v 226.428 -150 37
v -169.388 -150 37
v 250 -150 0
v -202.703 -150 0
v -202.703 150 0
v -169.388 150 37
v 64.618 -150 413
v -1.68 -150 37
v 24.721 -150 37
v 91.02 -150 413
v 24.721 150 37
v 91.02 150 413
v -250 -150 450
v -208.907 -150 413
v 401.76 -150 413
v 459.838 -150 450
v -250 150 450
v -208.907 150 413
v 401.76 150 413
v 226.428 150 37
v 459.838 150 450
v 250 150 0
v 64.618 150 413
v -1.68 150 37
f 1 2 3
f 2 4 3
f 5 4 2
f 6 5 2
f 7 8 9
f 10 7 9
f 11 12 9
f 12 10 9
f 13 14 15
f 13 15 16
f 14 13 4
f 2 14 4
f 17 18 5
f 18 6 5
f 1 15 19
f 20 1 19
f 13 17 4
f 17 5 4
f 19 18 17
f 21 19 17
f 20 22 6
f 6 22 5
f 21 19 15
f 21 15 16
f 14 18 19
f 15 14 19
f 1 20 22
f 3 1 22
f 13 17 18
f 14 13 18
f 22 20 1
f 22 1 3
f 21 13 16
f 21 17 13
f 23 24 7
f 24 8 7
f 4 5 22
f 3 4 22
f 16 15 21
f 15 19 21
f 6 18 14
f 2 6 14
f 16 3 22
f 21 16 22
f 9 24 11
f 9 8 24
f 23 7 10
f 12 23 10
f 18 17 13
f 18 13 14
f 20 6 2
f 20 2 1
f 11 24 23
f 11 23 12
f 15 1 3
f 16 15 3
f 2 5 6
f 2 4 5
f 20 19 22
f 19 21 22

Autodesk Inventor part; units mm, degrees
ref_plane "YZ Plane" through (0, 0, 0) normal (1, 0, 0) x (0, 1, 0)
ref_plane "XZ Plane" through (0, 0, 0) normal (0, 1, 0) x (-1, 0, 0)
ref_plane "XY Plane" through (0, 0, 0) normal (0, 0, 1) x (1, 0, 0)
sketch "Sketch1" plane through (0, 0, 0) normal (0, 0, 1) x (1, 0, 0)
  line L0 (-250, -150) -> (250, -150)
  line L1 (250, -150) -> (250, 150)
  line L2 (250, 150) -> (-250, 150)
  line L3 (-250, 150) -> (-250, -150)
  line L4 (-250, -150) -> (250, 150) construction
  line L5 (250, -150) -> (-250, 150) construction
  point P0 (0, 0)
  dimension "d0" = 500
  dimension "d1" = 300
extrude "Extrusion1" add sketch "Sketch1" along normal blind 450
draft "FaceDraft1" angle 25 pull direction (0, 0, -1) faces at (250, -50, 150) fixed edges at (250, 0, 0)
draft "FaceDraft2" angle 6 pull direction (0, 0, -1) faces at (-250, 50, 150) fixed edges at (-250, 0, 450)
shell "Shell1" thickness 37 removed faces 2 at (153.2795, -150, 300) at (153.2795, 150, 300)
sketch "Sketch2" plane through (-202.7031, -150, 0) normal (0, -1, 0) x (1, 0, 0)
  line L0 (-6.2042, 413) -> (604.4632, 413) construction
  line L1 (-47.2969, 450) -> (-6.2042, 413)
  line L2 (-6.2042, 413) -> (604.4632, 413)
  line L3 (604.4632, 413) -> (662.5415, 450)
  line L4 (0, 0) -> (33.3149, 37)
  line L5 (33.3149, 37) -> (429.1315, 37)
  line L6 (429.1315, 37) -> (452.7031, 0)
  point P0 (202.7031, 0)
surface extrude "ExtrusionSrf1" sketch "Sketch2" against normal up to surface (300 mm away) shown yes curves L1 L2 L3
surface extrude "ExtrusionSrf2" sketch "Sketch2" against normal up to surface (300 mm away) shown yes curves L4 L5 L6
split body "Split1" sketch "Sketch2" result two bodies curves L1 L2 L3 first body at (-13.3872, 50, 449.5)
split body "Split2" result two bodies by surface "ExtrusionSrf2" bodies 3 first body at (99.099, -50, 0.5)
sketch "Sketch3" plane through (-250, -150, 450) normal (0, -1, 0) x (1, 0, 0)
  line L0 (314.6185, -37) -> (341.0196, -37)
  line L1 (341.0196, -37) -> (274.7206, -413)
  line L2 (80.6119, -413) -> (476.4284, -413) projected
  line L3 (248.3195, -413) -> (314.6185, -37)
  line L4 (41.0927, -37) -> (651.7601, -37) projected
  line L5 (651.7601, -37) -> (476.4284, -413) projected
  point P0 (250, -450)
  dimension "d11" = 26
  dimension "d14" = 80
extrude "Extrusion2" add sketch "Sketch3" against normal up to surface (300 mm away) separate body contours L0 L1 L2 L3
properties part number "Slant Box"
